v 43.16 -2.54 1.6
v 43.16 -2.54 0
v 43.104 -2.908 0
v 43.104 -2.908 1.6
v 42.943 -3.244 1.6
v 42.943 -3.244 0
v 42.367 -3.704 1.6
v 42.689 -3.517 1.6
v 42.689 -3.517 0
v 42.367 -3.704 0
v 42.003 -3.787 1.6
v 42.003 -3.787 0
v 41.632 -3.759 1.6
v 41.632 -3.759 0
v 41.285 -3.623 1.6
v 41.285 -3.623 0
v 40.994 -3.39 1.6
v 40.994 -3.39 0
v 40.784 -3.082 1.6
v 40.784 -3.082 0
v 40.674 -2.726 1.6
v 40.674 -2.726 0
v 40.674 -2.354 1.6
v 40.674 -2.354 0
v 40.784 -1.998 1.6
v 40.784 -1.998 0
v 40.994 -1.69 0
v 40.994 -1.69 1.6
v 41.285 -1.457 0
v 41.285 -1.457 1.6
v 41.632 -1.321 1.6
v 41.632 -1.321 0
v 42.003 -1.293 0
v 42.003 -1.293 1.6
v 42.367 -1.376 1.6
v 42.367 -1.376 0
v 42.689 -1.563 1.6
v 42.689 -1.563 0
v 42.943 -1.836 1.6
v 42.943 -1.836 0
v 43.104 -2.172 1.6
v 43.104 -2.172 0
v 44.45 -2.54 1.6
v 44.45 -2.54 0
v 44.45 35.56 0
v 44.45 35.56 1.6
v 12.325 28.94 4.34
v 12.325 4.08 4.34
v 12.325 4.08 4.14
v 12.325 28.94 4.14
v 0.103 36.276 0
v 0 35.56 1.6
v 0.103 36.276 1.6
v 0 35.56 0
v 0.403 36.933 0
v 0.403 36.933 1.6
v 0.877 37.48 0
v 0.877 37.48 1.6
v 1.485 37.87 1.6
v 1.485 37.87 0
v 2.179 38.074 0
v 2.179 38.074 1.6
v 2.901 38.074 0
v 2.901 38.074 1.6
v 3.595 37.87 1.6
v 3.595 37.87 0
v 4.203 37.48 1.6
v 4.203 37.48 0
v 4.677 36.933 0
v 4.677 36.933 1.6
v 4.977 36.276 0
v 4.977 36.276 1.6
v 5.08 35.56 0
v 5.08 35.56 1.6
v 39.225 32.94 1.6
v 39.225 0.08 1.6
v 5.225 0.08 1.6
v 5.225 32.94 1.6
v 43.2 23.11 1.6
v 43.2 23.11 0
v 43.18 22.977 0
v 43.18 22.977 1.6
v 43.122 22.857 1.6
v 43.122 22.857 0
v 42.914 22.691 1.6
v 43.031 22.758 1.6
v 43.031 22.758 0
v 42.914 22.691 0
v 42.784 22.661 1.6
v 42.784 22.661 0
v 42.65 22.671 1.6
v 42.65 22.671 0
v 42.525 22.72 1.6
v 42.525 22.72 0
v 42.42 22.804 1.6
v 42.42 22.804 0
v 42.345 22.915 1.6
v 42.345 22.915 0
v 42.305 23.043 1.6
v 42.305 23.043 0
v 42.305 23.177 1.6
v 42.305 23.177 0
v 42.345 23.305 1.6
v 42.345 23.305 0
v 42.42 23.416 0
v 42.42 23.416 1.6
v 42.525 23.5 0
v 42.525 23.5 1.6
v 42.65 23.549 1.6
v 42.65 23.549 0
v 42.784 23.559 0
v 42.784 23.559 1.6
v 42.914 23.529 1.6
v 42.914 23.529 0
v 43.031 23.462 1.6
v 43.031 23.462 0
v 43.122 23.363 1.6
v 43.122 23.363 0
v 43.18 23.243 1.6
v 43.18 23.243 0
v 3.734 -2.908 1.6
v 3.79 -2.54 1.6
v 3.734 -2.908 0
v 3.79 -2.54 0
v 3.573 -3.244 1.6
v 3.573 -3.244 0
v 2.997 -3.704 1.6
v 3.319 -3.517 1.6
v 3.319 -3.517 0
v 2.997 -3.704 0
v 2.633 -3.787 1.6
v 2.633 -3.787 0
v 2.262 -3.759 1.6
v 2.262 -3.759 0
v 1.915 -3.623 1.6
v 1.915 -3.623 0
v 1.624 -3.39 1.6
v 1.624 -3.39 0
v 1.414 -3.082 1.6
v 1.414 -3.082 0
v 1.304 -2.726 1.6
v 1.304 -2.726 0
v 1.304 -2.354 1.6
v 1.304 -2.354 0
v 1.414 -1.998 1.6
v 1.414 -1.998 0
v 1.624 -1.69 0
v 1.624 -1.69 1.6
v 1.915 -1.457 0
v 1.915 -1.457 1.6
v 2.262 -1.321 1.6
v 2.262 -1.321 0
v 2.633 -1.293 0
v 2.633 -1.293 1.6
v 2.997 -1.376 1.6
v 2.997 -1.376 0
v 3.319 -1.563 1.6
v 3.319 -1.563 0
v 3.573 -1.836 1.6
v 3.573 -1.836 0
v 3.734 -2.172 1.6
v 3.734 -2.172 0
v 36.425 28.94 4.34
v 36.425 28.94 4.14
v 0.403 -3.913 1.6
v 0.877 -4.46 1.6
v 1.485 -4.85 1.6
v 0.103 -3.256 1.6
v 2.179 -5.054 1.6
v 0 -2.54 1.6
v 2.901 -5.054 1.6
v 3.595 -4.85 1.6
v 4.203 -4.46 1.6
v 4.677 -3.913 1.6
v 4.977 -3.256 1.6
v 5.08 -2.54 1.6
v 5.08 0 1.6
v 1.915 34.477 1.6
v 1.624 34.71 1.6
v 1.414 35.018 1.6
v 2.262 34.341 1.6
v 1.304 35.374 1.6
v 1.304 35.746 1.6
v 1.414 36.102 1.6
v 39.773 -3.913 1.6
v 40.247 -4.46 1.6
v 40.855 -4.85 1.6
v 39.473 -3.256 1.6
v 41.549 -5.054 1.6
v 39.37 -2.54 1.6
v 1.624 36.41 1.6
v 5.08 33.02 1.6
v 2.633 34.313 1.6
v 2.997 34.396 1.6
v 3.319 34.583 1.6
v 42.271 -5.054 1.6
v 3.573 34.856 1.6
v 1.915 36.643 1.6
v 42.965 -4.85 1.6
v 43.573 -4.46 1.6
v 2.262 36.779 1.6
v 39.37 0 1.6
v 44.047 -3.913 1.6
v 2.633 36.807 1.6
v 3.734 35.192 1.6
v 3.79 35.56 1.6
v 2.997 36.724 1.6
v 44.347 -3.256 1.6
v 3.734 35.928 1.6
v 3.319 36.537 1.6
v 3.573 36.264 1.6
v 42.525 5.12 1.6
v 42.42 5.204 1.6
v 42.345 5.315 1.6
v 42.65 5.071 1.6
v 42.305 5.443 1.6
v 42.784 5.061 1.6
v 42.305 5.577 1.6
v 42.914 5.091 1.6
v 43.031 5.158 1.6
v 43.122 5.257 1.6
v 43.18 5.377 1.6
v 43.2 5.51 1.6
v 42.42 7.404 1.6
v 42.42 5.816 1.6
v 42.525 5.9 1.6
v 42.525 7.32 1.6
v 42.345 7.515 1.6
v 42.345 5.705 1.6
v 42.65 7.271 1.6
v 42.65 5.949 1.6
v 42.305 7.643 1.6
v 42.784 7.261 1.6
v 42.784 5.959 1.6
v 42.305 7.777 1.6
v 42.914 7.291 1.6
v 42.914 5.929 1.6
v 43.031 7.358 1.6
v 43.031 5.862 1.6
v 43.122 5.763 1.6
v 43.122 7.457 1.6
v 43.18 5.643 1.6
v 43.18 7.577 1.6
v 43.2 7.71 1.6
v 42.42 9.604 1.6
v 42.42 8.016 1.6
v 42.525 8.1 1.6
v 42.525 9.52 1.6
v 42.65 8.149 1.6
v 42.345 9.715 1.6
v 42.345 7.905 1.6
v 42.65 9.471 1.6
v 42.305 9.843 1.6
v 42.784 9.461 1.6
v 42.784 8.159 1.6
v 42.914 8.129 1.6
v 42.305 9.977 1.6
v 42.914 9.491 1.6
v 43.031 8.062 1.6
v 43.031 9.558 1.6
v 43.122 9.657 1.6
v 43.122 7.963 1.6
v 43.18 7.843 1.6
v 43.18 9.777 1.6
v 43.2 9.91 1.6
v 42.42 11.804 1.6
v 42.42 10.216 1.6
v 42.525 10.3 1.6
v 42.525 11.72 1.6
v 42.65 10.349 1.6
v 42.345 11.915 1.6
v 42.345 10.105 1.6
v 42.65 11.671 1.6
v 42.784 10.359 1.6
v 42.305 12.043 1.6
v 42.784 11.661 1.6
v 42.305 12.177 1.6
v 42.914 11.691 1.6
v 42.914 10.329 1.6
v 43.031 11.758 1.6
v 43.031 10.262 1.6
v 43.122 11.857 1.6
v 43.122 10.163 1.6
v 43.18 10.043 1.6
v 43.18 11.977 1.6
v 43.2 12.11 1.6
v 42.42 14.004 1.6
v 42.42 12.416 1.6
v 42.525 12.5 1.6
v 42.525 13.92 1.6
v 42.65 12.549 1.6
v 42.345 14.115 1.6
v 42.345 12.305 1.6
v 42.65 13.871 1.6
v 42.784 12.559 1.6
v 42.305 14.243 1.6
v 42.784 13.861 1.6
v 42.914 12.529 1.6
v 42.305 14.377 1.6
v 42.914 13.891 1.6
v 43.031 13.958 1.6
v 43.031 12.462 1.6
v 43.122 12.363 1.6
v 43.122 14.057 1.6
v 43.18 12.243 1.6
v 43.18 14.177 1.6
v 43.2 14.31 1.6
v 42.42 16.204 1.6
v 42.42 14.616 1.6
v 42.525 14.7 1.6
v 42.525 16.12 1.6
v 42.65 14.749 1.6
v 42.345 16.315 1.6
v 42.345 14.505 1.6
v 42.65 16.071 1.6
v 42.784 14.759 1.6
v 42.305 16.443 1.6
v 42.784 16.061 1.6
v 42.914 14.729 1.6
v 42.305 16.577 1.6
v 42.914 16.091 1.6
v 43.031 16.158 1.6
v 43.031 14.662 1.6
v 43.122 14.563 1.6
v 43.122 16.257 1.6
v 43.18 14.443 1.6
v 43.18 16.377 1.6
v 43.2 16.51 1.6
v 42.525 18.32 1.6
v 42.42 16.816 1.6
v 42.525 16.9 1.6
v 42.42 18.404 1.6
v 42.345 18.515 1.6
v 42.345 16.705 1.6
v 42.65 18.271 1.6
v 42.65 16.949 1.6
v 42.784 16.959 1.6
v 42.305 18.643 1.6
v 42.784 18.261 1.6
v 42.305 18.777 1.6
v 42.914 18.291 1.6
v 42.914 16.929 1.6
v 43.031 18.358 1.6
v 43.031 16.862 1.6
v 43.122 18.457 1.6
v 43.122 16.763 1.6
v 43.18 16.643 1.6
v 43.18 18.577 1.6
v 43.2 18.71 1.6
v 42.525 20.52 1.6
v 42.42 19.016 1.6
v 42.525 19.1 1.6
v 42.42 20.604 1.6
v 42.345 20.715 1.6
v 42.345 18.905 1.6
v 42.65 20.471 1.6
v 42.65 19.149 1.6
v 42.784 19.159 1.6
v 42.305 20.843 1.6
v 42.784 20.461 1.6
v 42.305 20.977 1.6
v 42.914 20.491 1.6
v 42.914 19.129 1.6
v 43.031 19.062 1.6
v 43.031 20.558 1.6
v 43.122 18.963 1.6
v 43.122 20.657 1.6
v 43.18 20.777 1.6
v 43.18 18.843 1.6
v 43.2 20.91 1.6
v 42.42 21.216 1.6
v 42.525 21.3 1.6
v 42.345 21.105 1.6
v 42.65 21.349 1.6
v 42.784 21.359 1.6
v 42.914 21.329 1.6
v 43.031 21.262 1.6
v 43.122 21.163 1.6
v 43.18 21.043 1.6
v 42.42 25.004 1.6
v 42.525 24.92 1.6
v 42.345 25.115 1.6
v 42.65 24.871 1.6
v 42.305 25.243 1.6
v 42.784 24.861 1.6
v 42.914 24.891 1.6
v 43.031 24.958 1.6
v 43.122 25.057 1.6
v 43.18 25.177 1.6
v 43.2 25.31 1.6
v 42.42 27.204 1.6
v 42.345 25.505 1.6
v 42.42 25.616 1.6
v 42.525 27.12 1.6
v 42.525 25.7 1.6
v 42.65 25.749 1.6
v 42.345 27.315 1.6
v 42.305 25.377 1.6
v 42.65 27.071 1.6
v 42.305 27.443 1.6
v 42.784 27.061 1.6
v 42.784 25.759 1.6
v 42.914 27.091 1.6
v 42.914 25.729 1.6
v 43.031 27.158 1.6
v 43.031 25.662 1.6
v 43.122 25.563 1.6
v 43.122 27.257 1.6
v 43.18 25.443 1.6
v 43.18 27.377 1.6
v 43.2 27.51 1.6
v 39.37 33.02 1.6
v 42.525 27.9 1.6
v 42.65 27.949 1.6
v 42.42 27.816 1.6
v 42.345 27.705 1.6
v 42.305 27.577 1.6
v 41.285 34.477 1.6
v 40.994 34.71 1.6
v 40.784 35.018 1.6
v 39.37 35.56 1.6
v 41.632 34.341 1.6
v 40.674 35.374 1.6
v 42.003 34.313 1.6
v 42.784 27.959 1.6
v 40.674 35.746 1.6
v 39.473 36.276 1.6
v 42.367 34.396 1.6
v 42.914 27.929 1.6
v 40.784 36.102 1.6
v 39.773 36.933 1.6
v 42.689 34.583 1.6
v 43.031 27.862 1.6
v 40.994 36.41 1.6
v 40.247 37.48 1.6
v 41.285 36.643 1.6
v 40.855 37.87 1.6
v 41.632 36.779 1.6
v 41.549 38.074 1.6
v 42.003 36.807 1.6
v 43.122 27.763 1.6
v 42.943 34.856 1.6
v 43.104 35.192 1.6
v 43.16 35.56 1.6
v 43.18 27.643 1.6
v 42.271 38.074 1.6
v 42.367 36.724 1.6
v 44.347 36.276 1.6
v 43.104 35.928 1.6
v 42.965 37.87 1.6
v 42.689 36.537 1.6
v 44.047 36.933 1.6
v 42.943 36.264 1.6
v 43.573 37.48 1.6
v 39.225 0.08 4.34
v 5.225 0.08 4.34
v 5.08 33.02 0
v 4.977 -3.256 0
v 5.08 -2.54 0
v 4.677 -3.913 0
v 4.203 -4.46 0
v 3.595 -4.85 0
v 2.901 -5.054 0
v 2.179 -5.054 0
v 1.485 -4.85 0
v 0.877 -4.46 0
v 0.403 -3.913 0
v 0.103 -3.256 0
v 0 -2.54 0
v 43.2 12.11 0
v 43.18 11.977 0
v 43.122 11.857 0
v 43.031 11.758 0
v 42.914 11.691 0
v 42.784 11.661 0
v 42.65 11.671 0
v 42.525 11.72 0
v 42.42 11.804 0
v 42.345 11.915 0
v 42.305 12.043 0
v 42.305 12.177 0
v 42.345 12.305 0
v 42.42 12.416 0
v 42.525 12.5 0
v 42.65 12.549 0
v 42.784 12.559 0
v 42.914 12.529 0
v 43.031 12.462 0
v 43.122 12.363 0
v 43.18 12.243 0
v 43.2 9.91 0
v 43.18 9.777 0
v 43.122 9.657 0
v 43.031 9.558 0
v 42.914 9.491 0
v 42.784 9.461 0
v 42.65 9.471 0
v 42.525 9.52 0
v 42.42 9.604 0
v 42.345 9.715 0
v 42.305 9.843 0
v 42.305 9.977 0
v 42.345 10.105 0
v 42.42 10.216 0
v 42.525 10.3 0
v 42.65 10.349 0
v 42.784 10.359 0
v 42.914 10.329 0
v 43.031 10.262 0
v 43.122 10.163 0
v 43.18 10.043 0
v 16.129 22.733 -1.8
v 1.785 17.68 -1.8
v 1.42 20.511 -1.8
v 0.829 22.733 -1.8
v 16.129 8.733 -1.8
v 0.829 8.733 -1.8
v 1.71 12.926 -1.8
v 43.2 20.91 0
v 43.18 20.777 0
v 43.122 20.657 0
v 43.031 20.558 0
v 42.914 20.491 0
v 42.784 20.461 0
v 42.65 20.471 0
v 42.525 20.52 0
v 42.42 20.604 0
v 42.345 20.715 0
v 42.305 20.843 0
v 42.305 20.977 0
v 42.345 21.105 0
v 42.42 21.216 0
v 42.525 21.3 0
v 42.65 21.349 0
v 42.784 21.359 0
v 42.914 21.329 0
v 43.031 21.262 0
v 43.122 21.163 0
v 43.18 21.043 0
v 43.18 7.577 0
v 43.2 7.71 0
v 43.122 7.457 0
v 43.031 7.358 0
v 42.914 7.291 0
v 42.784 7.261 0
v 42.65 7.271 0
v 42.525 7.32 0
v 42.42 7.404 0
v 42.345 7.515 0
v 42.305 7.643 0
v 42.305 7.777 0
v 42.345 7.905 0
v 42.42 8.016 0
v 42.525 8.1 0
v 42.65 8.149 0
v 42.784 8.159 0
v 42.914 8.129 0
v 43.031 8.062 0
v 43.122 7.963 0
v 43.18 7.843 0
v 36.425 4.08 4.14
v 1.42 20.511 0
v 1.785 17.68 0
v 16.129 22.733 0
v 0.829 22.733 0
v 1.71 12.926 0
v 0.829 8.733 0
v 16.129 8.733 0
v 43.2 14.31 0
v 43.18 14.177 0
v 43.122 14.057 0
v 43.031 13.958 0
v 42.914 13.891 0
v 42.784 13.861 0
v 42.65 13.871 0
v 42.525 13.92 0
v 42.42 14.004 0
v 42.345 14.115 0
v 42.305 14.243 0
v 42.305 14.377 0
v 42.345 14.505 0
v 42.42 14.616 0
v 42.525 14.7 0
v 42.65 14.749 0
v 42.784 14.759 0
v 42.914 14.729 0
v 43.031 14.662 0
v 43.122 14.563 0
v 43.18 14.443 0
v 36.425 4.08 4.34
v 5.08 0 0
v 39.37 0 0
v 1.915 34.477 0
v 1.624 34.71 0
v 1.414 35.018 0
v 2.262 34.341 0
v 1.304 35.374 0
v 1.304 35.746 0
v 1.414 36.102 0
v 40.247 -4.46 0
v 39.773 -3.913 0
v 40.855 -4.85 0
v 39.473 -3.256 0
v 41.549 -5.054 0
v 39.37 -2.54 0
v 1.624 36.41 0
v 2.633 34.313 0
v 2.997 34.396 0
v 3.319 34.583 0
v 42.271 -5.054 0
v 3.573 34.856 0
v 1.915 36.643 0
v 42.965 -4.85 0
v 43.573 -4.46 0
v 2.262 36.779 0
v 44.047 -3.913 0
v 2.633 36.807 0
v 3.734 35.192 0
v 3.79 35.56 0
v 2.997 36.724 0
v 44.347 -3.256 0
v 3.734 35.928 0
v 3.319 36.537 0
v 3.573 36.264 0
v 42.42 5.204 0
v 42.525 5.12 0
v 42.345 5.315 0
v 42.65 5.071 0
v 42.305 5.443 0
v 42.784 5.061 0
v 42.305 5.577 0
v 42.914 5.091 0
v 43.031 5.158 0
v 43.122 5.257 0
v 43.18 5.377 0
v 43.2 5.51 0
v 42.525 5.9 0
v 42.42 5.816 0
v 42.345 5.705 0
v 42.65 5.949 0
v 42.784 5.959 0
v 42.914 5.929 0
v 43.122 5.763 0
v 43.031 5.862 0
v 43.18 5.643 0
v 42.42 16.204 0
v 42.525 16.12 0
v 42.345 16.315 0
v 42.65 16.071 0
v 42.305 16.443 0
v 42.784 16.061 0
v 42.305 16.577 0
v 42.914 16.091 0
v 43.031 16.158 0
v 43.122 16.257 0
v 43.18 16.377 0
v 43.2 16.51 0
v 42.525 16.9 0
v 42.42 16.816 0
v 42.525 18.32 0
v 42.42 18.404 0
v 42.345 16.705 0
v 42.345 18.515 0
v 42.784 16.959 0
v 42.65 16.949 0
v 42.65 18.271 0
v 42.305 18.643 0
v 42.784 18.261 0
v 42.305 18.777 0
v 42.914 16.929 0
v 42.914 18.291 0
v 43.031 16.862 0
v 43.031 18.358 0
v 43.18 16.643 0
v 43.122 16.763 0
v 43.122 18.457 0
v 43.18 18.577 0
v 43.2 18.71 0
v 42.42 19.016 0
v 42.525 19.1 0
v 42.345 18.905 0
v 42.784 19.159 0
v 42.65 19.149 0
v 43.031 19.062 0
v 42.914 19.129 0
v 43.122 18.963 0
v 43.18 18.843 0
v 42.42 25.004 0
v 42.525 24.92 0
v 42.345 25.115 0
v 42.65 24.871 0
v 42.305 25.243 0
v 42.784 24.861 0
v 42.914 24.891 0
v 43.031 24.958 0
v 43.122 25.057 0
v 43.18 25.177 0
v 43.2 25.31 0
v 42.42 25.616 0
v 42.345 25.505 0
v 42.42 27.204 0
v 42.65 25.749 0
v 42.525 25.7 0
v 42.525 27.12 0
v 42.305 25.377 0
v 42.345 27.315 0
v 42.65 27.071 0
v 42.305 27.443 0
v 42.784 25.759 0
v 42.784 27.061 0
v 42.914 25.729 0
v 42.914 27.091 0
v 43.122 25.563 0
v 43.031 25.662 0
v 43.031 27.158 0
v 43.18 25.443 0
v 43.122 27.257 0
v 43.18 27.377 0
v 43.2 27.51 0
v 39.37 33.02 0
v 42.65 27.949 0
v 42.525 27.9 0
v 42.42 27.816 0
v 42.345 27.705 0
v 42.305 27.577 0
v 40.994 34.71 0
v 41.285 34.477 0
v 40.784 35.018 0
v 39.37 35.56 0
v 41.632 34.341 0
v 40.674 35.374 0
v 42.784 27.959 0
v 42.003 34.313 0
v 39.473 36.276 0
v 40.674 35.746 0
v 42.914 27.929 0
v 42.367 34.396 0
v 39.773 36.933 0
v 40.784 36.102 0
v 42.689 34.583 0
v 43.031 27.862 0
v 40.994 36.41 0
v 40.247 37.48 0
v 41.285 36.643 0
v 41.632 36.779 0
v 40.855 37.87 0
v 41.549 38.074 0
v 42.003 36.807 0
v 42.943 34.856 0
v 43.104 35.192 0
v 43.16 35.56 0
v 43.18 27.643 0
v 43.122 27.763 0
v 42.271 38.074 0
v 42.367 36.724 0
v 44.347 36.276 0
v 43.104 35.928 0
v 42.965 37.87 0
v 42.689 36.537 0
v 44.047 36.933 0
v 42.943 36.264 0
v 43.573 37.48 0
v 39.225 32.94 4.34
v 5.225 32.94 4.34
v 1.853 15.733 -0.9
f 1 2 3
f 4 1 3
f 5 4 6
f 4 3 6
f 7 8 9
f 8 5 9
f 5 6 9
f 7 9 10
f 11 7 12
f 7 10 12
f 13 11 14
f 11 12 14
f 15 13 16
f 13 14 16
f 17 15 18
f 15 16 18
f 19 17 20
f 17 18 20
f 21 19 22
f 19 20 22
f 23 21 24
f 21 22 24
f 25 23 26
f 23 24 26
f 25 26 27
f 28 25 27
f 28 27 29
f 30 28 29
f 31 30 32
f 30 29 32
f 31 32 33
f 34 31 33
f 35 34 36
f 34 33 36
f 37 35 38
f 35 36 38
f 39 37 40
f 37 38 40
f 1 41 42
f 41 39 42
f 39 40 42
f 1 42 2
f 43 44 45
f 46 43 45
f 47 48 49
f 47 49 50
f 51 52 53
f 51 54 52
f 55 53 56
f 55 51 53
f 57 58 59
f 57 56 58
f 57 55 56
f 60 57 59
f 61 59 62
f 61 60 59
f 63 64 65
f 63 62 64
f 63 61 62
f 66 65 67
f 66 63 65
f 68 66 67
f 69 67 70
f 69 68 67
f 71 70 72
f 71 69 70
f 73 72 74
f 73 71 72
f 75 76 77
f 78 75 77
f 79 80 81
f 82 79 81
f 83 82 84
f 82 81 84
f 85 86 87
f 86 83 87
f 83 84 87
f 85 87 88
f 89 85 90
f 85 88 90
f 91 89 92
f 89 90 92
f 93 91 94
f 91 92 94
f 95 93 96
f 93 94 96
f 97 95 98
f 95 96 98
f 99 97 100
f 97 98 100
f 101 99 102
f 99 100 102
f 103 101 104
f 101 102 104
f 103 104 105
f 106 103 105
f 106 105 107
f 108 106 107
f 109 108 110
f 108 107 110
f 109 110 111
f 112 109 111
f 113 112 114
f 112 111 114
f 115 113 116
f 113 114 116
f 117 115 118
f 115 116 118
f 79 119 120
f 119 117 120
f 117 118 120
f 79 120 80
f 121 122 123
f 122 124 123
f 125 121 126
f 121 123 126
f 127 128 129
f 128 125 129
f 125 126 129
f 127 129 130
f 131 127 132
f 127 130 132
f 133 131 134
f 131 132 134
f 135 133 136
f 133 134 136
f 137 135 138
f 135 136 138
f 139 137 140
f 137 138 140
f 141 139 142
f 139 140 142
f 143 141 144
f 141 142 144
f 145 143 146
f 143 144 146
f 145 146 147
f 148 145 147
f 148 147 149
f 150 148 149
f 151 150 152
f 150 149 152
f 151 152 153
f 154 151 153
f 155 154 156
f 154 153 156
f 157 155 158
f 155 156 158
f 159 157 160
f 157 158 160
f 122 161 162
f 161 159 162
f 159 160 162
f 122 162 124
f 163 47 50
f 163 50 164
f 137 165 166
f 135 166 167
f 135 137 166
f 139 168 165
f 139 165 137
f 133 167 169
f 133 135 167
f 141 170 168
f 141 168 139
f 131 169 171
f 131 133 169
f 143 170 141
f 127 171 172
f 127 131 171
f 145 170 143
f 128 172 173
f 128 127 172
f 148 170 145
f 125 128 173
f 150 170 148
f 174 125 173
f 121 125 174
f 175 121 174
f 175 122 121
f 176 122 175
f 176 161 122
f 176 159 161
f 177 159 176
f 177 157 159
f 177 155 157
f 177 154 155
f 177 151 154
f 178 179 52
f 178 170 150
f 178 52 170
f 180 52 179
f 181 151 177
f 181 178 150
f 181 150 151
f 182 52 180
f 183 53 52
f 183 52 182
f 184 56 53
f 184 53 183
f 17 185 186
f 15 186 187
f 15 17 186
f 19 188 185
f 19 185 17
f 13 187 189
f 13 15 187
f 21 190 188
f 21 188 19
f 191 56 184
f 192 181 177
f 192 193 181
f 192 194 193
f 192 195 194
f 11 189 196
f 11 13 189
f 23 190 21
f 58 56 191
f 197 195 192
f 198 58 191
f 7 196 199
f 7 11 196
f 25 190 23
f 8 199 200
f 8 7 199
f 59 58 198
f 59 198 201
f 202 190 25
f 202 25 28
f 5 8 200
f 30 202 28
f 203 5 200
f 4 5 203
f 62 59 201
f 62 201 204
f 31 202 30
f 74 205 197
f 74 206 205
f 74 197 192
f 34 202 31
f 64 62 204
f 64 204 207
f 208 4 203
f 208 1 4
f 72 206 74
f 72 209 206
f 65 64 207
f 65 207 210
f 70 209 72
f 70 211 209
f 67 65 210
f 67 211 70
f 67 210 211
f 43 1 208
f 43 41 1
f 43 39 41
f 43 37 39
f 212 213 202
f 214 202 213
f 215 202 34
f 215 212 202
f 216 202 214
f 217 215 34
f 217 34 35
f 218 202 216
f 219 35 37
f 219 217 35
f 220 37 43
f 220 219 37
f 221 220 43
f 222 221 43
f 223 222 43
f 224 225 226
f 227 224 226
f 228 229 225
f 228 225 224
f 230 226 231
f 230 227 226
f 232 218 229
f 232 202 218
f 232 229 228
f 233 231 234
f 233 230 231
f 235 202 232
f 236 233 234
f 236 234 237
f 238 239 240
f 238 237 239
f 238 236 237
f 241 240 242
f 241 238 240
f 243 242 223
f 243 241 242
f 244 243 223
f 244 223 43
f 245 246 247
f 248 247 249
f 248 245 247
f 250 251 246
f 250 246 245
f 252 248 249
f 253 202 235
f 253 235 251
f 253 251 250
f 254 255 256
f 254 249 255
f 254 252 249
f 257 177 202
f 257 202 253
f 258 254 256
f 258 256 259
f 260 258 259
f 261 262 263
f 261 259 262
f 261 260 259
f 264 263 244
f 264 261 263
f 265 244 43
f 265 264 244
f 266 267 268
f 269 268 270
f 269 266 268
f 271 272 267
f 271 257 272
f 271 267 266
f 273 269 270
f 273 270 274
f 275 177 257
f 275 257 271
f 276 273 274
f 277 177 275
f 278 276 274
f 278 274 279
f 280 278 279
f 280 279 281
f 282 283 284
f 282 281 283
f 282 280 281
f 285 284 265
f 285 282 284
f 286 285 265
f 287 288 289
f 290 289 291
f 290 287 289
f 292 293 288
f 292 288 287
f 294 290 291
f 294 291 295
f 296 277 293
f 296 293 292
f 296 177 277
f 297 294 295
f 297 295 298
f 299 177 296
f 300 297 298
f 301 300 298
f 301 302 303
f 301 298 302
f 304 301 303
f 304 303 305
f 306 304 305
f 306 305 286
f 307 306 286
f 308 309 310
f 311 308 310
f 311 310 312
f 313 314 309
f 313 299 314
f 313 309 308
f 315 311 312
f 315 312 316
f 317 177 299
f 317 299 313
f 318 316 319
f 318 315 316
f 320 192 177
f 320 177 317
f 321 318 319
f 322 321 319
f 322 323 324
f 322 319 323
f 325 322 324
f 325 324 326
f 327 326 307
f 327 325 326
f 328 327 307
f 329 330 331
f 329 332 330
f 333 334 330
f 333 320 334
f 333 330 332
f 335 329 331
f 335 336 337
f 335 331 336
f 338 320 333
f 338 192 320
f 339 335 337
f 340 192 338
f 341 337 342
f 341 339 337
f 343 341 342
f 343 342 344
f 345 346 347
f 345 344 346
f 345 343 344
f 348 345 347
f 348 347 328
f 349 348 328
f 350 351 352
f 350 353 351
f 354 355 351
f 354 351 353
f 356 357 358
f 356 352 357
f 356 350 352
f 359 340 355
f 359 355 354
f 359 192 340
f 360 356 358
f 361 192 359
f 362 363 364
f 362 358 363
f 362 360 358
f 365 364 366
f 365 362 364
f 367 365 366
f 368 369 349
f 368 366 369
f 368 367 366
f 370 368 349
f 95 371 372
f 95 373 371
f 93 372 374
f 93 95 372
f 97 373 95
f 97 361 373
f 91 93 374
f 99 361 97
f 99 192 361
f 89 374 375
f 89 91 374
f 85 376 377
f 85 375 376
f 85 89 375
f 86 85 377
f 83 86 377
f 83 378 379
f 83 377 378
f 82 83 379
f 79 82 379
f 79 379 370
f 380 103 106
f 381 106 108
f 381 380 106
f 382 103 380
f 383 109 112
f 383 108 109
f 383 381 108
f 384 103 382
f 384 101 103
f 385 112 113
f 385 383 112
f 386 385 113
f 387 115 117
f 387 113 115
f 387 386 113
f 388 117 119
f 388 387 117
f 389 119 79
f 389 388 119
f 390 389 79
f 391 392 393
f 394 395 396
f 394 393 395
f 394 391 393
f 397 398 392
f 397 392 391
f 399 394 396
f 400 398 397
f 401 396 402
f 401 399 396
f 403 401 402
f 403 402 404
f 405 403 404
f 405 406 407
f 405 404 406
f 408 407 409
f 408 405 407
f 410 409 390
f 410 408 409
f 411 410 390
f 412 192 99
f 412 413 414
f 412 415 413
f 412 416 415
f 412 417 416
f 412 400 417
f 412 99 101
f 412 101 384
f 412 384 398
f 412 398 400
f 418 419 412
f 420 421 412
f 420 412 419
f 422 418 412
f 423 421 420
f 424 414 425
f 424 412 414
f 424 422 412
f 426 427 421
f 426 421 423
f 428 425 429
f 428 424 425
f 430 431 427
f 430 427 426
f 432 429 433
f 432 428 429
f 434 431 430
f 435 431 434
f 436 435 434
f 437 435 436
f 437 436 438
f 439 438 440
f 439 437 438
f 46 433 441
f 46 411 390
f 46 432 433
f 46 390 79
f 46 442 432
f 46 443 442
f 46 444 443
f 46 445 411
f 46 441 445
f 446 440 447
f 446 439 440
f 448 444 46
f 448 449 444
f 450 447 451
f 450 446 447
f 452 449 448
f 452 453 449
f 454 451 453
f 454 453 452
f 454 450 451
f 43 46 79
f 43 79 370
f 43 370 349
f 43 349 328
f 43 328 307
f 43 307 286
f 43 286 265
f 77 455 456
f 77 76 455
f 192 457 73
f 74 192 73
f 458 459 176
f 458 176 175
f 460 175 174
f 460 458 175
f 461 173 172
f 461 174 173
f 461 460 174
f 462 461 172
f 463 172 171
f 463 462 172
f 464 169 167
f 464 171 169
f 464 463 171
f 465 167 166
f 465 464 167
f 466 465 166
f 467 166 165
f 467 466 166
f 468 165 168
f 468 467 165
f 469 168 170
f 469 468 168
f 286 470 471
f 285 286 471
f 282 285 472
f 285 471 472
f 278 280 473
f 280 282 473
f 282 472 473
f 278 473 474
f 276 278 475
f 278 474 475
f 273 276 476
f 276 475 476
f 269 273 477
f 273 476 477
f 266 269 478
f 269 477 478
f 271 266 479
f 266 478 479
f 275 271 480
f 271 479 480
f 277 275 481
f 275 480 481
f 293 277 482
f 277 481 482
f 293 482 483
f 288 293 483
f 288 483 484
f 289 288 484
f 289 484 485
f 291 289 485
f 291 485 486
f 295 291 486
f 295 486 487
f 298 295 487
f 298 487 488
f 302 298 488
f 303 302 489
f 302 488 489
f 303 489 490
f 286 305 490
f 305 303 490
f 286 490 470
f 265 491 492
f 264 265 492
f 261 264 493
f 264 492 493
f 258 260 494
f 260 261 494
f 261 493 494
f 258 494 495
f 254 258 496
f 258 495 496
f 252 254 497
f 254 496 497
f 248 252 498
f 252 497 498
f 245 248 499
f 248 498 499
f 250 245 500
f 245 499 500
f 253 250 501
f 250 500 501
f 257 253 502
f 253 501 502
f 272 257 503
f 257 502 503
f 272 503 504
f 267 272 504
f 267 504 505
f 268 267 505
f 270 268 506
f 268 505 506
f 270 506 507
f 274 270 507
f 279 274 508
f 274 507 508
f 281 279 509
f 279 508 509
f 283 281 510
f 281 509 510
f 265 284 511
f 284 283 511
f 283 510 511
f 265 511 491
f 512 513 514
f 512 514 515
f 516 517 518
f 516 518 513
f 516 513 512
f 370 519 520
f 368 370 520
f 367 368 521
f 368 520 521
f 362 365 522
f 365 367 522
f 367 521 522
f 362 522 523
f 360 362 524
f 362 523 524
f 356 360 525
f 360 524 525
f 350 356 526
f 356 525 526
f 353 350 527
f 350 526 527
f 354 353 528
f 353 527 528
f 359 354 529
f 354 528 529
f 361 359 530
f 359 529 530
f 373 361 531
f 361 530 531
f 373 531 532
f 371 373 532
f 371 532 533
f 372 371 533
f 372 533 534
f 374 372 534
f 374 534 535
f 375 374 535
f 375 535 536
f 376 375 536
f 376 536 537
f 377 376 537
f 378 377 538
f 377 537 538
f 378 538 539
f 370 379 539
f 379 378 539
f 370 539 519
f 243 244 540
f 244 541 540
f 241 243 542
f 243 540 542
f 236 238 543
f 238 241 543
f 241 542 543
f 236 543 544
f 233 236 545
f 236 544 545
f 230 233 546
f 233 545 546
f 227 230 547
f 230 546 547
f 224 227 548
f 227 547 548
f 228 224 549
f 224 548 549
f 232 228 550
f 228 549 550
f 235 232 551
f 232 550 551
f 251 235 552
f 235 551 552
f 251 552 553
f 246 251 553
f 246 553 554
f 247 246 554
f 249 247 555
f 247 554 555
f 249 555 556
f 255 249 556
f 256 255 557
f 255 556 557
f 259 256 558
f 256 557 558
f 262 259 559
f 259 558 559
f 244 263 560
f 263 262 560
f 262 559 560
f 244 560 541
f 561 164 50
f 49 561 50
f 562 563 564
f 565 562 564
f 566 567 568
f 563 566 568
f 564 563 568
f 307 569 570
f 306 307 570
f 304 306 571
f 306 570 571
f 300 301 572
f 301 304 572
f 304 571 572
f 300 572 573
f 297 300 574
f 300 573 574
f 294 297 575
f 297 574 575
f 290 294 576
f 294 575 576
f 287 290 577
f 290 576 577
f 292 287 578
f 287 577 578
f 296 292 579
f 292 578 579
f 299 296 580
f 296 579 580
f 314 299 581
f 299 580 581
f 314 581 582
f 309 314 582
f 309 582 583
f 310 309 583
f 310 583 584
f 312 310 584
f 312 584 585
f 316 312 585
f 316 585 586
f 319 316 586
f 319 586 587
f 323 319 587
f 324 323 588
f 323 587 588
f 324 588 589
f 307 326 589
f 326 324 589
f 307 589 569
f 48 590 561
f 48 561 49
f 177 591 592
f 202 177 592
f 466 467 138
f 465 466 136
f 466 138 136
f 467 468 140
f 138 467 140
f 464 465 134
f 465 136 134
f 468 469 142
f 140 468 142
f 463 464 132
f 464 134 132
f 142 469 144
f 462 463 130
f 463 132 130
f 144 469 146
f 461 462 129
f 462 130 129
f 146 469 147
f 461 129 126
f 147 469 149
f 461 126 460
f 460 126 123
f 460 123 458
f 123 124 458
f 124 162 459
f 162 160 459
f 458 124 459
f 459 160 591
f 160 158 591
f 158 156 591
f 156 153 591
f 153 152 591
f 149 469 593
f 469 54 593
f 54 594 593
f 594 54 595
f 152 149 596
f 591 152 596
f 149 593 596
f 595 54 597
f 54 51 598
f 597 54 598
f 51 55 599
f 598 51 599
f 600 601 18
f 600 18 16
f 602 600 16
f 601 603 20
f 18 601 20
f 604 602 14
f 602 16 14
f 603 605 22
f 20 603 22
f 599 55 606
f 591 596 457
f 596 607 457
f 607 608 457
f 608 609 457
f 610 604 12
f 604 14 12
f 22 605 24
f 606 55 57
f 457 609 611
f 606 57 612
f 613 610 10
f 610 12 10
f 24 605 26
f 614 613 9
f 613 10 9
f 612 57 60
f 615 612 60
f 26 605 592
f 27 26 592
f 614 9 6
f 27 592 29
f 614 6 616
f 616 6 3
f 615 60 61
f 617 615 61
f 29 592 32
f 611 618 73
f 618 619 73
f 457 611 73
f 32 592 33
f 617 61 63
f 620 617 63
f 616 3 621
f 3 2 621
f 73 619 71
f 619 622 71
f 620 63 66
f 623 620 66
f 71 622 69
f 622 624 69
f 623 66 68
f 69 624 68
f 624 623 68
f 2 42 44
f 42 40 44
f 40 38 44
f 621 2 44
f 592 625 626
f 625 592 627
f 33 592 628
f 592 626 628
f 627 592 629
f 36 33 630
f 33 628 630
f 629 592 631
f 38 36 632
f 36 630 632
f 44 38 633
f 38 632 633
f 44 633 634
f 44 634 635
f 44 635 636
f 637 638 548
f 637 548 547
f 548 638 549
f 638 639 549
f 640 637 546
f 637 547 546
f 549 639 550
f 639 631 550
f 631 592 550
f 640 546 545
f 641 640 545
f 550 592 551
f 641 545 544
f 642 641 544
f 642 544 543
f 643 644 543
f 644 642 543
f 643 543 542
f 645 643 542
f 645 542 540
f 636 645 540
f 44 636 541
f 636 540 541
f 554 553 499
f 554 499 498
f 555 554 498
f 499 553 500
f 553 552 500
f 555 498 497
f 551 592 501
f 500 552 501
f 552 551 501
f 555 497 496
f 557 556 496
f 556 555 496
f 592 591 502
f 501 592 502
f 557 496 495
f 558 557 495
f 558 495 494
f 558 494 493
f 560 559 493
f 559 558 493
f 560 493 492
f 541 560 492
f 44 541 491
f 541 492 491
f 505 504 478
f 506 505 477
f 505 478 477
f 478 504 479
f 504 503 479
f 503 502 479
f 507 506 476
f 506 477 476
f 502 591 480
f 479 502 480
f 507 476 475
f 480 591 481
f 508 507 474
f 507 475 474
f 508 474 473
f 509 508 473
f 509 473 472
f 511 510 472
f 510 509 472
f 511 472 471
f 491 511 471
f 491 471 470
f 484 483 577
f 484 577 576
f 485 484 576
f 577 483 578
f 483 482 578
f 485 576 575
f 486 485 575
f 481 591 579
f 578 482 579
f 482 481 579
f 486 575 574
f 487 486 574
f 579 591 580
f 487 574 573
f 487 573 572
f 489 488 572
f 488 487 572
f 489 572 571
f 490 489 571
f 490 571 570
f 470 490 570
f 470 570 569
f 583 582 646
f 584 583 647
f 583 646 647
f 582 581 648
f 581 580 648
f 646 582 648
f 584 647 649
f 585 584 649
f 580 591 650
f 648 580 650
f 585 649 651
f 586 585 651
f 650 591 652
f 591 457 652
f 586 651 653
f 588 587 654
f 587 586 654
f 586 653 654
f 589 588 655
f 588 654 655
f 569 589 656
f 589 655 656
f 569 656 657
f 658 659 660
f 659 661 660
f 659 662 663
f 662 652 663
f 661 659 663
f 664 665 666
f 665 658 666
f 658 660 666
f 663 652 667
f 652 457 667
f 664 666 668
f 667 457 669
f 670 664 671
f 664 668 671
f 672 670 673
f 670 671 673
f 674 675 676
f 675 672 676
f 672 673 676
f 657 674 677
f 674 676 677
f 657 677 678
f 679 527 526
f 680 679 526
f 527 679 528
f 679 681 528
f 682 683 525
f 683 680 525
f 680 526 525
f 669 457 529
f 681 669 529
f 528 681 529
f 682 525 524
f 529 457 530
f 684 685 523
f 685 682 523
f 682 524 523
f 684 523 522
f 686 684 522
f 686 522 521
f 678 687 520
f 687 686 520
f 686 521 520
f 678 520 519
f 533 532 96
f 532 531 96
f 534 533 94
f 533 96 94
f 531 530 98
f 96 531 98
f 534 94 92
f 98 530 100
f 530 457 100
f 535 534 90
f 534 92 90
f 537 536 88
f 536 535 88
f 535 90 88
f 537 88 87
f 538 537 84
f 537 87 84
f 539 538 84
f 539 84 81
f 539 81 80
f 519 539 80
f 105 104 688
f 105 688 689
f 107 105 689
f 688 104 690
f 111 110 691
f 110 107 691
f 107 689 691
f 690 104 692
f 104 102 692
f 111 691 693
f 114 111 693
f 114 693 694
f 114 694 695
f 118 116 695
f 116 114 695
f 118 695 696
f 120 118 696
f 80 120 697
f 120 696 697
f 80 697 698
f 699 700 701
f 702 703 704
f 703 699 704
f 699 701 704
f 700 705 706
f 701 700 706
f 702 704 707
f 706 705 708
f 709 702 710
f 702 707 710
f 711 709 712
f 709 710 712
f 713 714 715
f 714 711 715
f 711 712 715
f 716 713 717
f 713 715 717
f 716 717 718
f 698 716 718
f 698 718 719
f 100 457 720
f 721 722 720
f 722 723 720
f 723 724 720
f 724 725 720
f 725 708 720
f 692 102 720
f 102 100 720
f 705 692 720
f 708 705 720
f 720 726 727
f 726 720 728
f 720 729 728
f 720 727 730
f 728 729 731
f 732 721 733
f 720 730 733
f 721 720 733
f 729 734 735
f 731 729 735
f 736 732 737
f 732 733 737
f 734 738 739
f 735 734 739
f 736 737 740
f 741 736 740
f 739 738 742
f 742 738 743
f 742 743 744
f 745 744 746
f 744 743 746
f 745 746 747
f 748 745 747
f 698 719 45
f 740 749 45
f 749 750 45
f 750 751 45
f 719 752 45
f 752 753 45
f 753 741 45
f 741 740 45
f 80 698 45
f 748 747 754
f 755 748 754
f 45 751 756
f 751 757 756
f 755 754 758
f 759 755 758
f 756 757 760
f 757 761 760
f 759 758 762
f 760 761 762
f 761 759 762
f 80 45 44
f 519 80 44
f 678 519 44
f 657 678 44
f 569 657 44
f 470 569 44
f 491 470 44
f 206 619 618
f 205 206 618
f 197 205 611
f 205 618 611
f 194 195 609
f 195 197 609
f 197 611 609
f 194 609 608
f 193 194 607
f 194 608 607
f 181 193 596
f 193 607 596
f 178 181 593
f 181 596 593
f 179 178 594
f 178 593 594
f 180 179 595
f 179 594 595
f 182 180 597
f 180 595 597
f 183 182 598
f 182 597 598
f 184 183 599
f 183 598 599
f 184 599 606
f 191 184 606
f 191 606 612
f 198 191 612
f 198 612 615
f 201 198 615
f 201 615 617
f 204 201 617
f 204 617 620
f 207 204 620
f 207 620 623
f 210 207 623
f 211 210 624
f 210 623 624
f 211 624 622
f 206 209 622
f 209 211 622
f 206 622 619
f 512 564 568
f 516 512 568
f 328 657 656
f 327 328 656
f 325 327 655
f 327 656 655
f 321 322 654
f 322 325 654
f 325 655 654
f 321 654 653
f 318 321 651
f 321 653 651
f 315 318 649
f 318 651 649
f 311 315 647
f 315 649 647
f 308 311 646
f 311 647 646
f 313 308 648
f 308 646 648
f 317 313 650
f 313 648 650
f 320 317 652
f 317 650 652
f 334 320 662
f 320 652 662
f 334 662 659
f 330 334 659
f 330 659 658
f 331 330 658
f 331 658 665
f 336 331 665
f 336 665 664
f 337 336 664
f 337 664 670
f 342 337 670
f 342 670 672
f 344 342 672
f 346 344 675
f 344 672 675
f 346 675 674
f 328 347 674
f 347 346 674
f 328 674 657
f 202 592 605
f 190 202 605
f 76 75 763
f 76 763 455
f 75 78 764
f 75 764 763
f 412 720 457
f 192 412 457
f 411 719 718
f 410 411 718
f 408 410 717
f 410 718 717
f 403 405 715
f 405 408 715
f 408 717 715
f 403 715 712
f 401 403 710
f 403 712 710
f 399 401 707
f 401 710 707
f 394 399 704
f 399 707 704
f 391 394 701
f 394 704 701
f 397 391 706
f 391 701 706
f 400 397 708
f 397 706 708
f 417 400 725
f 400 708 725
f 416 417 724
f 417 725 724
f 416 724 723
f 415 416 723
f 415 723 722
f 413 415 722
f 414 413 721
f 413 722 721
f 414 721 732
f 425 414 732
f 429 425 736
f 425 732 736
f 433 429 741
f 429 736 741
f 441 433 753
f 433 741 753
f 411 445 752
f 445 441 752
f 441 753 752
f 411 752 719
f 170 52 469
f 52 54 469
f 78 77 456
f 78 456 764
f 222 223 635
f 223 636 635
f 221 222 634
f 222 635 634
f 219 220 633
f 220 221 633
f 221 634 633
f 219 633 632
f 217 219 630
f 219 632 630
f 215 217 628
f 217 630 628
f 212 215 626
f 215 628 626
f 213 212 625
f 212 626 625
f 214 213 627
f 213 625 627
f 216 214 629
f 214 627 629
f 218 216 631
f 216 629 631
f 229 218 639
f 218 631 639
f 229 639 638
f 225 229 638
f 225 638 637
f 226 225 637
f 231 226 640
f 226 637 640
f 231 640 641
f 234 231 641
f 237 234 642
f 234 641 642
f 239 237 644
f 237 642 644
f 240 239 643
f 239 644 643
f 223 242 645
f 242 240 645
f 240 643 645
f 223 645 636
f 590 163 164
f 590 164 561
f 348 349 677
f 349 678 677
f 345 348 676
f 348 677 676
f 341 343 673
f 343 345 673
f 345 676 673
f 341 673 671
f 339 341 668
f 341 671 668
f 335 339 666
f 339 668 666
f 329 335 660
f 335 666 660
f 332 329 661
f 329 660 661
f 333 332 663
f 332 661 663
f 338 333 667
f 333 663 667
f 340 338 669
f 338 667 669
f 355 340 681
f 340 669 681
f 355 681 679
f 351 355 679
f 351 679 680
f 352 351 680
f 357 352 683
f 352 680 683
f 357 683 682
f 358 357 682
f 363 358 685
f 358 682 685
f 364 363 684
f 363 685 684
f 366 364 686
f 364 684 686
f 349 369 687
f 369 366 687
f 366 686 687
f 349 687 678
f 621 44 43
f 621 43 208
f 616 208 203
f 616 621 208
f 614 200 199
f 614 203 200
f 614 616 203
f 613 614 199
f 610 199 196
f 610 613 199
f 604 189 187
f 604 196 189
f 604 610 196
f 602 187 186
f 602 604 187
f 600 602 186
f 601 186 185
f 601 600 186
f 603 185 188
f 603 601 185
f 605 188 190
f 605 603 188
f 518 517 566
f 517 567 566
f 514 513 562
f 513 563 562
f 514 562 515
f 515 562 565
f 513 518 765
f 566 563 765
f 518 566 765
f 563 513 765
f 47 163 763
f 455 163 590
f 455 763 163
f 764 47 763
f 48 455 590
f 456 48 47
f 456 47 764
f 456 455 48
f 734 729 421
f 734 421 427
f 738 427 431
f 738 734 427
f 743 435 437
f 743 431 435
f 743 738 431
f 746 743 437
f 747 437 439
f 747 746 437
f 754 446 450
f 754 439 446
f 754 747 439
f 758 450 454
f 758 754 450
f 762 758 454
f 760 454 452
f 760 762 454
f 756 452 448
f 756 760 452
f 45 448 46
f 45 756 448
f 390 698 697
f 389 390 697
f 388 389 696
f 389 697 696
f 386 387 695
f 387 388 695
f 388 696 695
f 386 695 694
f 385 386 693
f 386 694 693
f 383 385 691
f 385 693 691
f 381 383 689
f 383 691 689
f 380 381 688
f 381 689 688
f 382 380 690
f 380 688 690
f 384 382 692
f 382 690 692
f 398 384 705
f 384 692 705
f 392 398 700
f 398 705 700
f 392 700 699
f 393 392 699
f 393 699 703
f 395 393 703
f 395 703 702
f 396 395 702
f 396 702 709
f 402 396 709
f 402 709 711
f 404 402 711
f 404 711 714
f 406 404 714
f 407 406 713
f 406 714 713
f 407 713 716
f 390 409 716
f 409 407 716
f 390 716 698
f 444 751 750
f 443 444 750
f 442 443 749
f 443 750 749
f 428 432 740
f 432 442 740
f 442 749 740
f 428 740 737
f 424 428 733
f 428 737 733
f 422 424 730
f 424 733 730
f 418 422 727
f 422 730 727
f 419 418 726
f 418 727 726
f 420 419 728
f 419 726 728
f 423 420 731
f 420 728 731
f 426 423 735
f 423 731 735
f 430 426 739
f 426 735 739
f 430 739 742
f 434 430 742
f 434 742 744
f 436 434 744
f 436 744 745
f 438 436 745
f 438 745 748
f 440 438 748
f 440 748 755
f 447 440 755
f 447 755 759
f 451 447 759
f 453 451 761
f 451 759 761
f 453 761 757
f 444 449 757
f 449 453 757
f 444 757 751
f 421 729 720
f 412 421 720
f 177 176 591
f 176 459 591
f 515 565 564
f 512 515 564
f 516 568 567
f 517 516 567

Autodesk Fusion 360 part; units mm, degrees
sketch "Adafruit TFT144 Breakout rev B" plane through (0, 0, 0) normal (0, 0, 1) x (1, 0, 0)
  line L0 (5.08, 33.02) -> (5.08, 35.56)
  arc A0 (2.54, 38.1) -> (0, 35.56) centre (2.54, 35.56) ccw
  line L1 (5.08, 0) -> (39.37, 0)
  arc A1 (0, -2.54) -> (2.54, -5.08) centre (2.54, -2.54) ccw
  arc A2 (44.45, 35.56) -> (41.91, 38.1) centre (41.91, 35.56) ccw
  line L2 (39.37, 33.02) -> (5.08, 33.02)
  arc A3 (39.37, -2.54) -> (41.91, -5.08) centre (41.91, -2.54) ccw
  arc A4 (5.08, 35.56) -> (2.54, 38.1) centre (2.54, 35.56) ccw
  line L3 (5.08, -2.54) -> (5.08, 0)
  arc A5 (41.91, 38.1) -> (39.37, 35.56) centre (41.91, 35.56) ccw
  arc A6 (41.91, -5.08) -> (44.45, -2.54) centre (41.91, -2.54) ccw
  line L4 (39.37, 35.56) -> (39.37, 33.02)
  line L5 (44.45, -2.54) -> (44.45, 35.56)
  line L6 (0, 35.56) -> (0, -2.54)
  line L7 (39.37, 0) -> (39.37, -2.54)
  arc A7 (2.54, -5.08) -> (5.08, -2.54) centre (2.54, -2.54) ccw
  circle A8 centre (2.54, 35.56) radius 1.25
  circle A9 centre (41.91, 35.56) radius 1.25
  circle A10 centre (2.54, -2.54) radius 1.25
  circle A11 centre (41.91, -2.54) radius 1.25
  line L8 (44.45, 16.51) -> (0, 16.51) construction
  circle A12 centre (42.75, 27.51) radius 0.45
  circle A13 centre (42.75, 25.31) radius 0.45
  circle A14 centre (42.75, 23.11) radius 0.45
  circle A15 centre (42.75, 20.91) radius 0.45
  circle A16 centre (42.75, 18.71) radius 0.45
  circle A17 centre (42.75, 16.51) radius 0.45
  circle A18 centre (42.75, 14.31) radius 0.45
  circle A19 centre (42.75, 12.11) radius 0.45
  circle A20 centre (42.75, 9.91) radius 0.45
  circle A21 centre (42.75, 7.71) radius 0.45
  circle A22 centre (42.75, 5.51) radius 0.45
  dimension "d3" = 2.5
  dimension "d4" = 2.5
  dimension "d5" = 2.5
  dimension "d6" = 2.5
  dimension "d25" = 0.9
  dimension "d26" = 1.7
  dimension "d29" = 0
  dimension "d30" = -2.2
extrude "Extrude1" add sketch "Adafruit TFT144 Breakout rev B" along normal blind 1.6 contours L0 A0 L1 A1 A2 L2 A3 A4 L3 A5 A6 L4 L5 L6 L7 A7 | A12 | A13 | A14 | A15 | A16 | A17 | A18 | A19 | A20 | A21 | A22 makes body 1
sketch "Display Glass" plane through (0, 0, 1.6) normal (0, 0, 1) x (-1, 0, 0)
  circle A0 centre (-41.91, -35.56) radius 1.25
  circle A1 centre (-41.91, 2.54) radius 1.25
  circle A2 centre (-2.54, 2.54) radius 1.25
  circle A3 centre (-2.54, -35.56) radius 1.25
  arc A4 (0, 2.54) -> (-5.08, 2.54) centre (-2.54, 2.54) ccw
  line L0 (-5.08, 2.54) -> (-5.08, 0)
  line L1 (-5.08, 0) -> (-39.37, 0)
  line L2 (-39.37, 0) -> (-39.37, 2.54)
  arc A5 (-39.37, 2.54) -> (-44.45, 2.54) centre (-41.91, 2.54) ccw
  line L3 (-44.45, 2.54) -> (-44.45, -35.56)
  arc A6 (-44.45, -35.56) -> (-39.37, -35.56) centre (-41.91, -35.56) ccw
  line L4 (-39.37, -35.56) -> (-39.37, -33.02)
  line L5 (-39.37, -33.02) -> (-5.08, -33.02)
  line L6 (-5.08, -33.02) -> (-5.08, -35.56)
  arc A7 (-5.08, -35.56) -> (0, -35.56) centre (-2.54, -35.56) ccw
  line L7 (0, -35.56) -> (0, 2.54)
  line L8 (-5.225, -32.94) -> (-39.225, -32.94)
  line L9 (-39.225, -32.94) -> (-39.225, -0.08)
  line L10 (-39.225, -0.08) -> (-5.225, -0.08)
  line L11 (-5.225, -0.08) -> (-5.225, -32.94)
  line L12 (-5.225, -16.51) -> (-39.225, -16.51) construction
  line L13 (-22.225, -32.94) -> (-22.225, -0.08) construction
  line L14 (0, -16.51) -> (-44.45, -16.51) construction
  line L15 (-22.225, -33.02) -> (-22.225, 0) construction
  dimension "d9" = 34
  dimension "d10" = 32.86
extrude "Extrude2" add sketch "Display Glass" along normal blind 2.74 separate body contours L8 L9 L10 L11 makes body 2
sketch "Display View" plane through (0, 0, 4.34) normal (0, 0, 1) x (-1, 0, 0)
  line L0 (-5.225, -0.08) -> (-39.225, -0.08)
  line L1 (-39.225, -0.08) -> (-39.225, -32.94)
  line L2 (-39.225, -32.94) -> (-5.225, -32.94)
  line L3 (-5.225, -32.94) -> (-5.225, -0.08)
  line L4 (-12.325, -28.94) -> (-36.425, -28.94)
  line L5 (-36.425, -28.94) -> (-36.425, -4.08)
  line L6 (-36.425, -4.08) -> (-12.325, -4.08)
  line L7 (-12.325, -4.08) -> (-12.325, -28.94)
  dimension "d13" = 2.8
  dimension "d14" = 7.1
  dimension "d15" = 4
  dimension "d16" = 4
extrude "Extrude3" cut sketch "Display View" against normal blind 0.2 contours L4 L5 L6 L7 bodies 2
sketch "microSD" plane through (0, 0, 0) normal (0, 0, -1) x (1, 0, 0)
  circle A0 centre (41.91, -35.56) radius 1.25
  circle A1 centre (41.91, 2.54) radius 1.25
  circle A2 centre (2.54, 2.54) radius 1.25
  circle A3 centre (2.54, -35.56) radius 1.25
  arc A4 (5.08, 2.54) -> (0, 2.54) centre (2.54, 2.54) ccw
  line L0 (0, 2.54) -> (0, -35.56)
  arc A5 (0, -35.56) -> (5.08, -35.56) centre (2.54, -35.56) ccw
  line L1 (5.08, -35.56) -> (5.08, -33.02)
  line L2 (5.08, -33.02) -> (39.37, -33.02)
  line L3 (39.37, -33.02) -> (39.37, -35.56)
  arc A6 (39.37, -35.56) -> (44.45, -35.56) centre (41.91, -35.56) ccw
  line L4 (44.45, -35.56) -> (44.45, 2.54)
  arc A7 (44.45, 2.54) -> (39.37, 2.54) centre (41.91, 2.54) ccw
  line L5 (39.37, 2.54) -> (39.37, 0)
  line L6 (39.37, 0) -> (5.08, 0)
  line L7 (5.08, 0) -> (5.08, 2.54)
  line L8 (0.829, -22.733) -> (16.129, -22.733)
  line L9 (16.129, -22.733) -> (16.129, -8.733)
  line L10 (16.129, -8.733) -> (0.829, -8.733)
  line L11 (0.829, -8.733) -> (0.829, -22.733)
  spline S0 degree 2 poles (0.829, -8.733) (3.3168, -15.733) (0.829, -22.733) knots 0 0 0 1.414905 1.414905 1.414905 weights 1 0.699738 1
  dimension "d19" = 15.3
  dimension "d20" = 14
  dimension "d21" = 22.733
  dimension "d22" = 16.129
extrude "Extrude4" add sketch "microSD" along normal blind 1.8 separate body contours L8 L9 L10 S0 makes body 3
extrude "Extrude5" cut sketch "Adafruit TFT144 Breakout rev B" along normal up to surface (1.6 mm away) contours A12 | A13 | A14 | A15 | A16 | A17 | A18 | A19 | A20 | A21 | A22 bodies 1
